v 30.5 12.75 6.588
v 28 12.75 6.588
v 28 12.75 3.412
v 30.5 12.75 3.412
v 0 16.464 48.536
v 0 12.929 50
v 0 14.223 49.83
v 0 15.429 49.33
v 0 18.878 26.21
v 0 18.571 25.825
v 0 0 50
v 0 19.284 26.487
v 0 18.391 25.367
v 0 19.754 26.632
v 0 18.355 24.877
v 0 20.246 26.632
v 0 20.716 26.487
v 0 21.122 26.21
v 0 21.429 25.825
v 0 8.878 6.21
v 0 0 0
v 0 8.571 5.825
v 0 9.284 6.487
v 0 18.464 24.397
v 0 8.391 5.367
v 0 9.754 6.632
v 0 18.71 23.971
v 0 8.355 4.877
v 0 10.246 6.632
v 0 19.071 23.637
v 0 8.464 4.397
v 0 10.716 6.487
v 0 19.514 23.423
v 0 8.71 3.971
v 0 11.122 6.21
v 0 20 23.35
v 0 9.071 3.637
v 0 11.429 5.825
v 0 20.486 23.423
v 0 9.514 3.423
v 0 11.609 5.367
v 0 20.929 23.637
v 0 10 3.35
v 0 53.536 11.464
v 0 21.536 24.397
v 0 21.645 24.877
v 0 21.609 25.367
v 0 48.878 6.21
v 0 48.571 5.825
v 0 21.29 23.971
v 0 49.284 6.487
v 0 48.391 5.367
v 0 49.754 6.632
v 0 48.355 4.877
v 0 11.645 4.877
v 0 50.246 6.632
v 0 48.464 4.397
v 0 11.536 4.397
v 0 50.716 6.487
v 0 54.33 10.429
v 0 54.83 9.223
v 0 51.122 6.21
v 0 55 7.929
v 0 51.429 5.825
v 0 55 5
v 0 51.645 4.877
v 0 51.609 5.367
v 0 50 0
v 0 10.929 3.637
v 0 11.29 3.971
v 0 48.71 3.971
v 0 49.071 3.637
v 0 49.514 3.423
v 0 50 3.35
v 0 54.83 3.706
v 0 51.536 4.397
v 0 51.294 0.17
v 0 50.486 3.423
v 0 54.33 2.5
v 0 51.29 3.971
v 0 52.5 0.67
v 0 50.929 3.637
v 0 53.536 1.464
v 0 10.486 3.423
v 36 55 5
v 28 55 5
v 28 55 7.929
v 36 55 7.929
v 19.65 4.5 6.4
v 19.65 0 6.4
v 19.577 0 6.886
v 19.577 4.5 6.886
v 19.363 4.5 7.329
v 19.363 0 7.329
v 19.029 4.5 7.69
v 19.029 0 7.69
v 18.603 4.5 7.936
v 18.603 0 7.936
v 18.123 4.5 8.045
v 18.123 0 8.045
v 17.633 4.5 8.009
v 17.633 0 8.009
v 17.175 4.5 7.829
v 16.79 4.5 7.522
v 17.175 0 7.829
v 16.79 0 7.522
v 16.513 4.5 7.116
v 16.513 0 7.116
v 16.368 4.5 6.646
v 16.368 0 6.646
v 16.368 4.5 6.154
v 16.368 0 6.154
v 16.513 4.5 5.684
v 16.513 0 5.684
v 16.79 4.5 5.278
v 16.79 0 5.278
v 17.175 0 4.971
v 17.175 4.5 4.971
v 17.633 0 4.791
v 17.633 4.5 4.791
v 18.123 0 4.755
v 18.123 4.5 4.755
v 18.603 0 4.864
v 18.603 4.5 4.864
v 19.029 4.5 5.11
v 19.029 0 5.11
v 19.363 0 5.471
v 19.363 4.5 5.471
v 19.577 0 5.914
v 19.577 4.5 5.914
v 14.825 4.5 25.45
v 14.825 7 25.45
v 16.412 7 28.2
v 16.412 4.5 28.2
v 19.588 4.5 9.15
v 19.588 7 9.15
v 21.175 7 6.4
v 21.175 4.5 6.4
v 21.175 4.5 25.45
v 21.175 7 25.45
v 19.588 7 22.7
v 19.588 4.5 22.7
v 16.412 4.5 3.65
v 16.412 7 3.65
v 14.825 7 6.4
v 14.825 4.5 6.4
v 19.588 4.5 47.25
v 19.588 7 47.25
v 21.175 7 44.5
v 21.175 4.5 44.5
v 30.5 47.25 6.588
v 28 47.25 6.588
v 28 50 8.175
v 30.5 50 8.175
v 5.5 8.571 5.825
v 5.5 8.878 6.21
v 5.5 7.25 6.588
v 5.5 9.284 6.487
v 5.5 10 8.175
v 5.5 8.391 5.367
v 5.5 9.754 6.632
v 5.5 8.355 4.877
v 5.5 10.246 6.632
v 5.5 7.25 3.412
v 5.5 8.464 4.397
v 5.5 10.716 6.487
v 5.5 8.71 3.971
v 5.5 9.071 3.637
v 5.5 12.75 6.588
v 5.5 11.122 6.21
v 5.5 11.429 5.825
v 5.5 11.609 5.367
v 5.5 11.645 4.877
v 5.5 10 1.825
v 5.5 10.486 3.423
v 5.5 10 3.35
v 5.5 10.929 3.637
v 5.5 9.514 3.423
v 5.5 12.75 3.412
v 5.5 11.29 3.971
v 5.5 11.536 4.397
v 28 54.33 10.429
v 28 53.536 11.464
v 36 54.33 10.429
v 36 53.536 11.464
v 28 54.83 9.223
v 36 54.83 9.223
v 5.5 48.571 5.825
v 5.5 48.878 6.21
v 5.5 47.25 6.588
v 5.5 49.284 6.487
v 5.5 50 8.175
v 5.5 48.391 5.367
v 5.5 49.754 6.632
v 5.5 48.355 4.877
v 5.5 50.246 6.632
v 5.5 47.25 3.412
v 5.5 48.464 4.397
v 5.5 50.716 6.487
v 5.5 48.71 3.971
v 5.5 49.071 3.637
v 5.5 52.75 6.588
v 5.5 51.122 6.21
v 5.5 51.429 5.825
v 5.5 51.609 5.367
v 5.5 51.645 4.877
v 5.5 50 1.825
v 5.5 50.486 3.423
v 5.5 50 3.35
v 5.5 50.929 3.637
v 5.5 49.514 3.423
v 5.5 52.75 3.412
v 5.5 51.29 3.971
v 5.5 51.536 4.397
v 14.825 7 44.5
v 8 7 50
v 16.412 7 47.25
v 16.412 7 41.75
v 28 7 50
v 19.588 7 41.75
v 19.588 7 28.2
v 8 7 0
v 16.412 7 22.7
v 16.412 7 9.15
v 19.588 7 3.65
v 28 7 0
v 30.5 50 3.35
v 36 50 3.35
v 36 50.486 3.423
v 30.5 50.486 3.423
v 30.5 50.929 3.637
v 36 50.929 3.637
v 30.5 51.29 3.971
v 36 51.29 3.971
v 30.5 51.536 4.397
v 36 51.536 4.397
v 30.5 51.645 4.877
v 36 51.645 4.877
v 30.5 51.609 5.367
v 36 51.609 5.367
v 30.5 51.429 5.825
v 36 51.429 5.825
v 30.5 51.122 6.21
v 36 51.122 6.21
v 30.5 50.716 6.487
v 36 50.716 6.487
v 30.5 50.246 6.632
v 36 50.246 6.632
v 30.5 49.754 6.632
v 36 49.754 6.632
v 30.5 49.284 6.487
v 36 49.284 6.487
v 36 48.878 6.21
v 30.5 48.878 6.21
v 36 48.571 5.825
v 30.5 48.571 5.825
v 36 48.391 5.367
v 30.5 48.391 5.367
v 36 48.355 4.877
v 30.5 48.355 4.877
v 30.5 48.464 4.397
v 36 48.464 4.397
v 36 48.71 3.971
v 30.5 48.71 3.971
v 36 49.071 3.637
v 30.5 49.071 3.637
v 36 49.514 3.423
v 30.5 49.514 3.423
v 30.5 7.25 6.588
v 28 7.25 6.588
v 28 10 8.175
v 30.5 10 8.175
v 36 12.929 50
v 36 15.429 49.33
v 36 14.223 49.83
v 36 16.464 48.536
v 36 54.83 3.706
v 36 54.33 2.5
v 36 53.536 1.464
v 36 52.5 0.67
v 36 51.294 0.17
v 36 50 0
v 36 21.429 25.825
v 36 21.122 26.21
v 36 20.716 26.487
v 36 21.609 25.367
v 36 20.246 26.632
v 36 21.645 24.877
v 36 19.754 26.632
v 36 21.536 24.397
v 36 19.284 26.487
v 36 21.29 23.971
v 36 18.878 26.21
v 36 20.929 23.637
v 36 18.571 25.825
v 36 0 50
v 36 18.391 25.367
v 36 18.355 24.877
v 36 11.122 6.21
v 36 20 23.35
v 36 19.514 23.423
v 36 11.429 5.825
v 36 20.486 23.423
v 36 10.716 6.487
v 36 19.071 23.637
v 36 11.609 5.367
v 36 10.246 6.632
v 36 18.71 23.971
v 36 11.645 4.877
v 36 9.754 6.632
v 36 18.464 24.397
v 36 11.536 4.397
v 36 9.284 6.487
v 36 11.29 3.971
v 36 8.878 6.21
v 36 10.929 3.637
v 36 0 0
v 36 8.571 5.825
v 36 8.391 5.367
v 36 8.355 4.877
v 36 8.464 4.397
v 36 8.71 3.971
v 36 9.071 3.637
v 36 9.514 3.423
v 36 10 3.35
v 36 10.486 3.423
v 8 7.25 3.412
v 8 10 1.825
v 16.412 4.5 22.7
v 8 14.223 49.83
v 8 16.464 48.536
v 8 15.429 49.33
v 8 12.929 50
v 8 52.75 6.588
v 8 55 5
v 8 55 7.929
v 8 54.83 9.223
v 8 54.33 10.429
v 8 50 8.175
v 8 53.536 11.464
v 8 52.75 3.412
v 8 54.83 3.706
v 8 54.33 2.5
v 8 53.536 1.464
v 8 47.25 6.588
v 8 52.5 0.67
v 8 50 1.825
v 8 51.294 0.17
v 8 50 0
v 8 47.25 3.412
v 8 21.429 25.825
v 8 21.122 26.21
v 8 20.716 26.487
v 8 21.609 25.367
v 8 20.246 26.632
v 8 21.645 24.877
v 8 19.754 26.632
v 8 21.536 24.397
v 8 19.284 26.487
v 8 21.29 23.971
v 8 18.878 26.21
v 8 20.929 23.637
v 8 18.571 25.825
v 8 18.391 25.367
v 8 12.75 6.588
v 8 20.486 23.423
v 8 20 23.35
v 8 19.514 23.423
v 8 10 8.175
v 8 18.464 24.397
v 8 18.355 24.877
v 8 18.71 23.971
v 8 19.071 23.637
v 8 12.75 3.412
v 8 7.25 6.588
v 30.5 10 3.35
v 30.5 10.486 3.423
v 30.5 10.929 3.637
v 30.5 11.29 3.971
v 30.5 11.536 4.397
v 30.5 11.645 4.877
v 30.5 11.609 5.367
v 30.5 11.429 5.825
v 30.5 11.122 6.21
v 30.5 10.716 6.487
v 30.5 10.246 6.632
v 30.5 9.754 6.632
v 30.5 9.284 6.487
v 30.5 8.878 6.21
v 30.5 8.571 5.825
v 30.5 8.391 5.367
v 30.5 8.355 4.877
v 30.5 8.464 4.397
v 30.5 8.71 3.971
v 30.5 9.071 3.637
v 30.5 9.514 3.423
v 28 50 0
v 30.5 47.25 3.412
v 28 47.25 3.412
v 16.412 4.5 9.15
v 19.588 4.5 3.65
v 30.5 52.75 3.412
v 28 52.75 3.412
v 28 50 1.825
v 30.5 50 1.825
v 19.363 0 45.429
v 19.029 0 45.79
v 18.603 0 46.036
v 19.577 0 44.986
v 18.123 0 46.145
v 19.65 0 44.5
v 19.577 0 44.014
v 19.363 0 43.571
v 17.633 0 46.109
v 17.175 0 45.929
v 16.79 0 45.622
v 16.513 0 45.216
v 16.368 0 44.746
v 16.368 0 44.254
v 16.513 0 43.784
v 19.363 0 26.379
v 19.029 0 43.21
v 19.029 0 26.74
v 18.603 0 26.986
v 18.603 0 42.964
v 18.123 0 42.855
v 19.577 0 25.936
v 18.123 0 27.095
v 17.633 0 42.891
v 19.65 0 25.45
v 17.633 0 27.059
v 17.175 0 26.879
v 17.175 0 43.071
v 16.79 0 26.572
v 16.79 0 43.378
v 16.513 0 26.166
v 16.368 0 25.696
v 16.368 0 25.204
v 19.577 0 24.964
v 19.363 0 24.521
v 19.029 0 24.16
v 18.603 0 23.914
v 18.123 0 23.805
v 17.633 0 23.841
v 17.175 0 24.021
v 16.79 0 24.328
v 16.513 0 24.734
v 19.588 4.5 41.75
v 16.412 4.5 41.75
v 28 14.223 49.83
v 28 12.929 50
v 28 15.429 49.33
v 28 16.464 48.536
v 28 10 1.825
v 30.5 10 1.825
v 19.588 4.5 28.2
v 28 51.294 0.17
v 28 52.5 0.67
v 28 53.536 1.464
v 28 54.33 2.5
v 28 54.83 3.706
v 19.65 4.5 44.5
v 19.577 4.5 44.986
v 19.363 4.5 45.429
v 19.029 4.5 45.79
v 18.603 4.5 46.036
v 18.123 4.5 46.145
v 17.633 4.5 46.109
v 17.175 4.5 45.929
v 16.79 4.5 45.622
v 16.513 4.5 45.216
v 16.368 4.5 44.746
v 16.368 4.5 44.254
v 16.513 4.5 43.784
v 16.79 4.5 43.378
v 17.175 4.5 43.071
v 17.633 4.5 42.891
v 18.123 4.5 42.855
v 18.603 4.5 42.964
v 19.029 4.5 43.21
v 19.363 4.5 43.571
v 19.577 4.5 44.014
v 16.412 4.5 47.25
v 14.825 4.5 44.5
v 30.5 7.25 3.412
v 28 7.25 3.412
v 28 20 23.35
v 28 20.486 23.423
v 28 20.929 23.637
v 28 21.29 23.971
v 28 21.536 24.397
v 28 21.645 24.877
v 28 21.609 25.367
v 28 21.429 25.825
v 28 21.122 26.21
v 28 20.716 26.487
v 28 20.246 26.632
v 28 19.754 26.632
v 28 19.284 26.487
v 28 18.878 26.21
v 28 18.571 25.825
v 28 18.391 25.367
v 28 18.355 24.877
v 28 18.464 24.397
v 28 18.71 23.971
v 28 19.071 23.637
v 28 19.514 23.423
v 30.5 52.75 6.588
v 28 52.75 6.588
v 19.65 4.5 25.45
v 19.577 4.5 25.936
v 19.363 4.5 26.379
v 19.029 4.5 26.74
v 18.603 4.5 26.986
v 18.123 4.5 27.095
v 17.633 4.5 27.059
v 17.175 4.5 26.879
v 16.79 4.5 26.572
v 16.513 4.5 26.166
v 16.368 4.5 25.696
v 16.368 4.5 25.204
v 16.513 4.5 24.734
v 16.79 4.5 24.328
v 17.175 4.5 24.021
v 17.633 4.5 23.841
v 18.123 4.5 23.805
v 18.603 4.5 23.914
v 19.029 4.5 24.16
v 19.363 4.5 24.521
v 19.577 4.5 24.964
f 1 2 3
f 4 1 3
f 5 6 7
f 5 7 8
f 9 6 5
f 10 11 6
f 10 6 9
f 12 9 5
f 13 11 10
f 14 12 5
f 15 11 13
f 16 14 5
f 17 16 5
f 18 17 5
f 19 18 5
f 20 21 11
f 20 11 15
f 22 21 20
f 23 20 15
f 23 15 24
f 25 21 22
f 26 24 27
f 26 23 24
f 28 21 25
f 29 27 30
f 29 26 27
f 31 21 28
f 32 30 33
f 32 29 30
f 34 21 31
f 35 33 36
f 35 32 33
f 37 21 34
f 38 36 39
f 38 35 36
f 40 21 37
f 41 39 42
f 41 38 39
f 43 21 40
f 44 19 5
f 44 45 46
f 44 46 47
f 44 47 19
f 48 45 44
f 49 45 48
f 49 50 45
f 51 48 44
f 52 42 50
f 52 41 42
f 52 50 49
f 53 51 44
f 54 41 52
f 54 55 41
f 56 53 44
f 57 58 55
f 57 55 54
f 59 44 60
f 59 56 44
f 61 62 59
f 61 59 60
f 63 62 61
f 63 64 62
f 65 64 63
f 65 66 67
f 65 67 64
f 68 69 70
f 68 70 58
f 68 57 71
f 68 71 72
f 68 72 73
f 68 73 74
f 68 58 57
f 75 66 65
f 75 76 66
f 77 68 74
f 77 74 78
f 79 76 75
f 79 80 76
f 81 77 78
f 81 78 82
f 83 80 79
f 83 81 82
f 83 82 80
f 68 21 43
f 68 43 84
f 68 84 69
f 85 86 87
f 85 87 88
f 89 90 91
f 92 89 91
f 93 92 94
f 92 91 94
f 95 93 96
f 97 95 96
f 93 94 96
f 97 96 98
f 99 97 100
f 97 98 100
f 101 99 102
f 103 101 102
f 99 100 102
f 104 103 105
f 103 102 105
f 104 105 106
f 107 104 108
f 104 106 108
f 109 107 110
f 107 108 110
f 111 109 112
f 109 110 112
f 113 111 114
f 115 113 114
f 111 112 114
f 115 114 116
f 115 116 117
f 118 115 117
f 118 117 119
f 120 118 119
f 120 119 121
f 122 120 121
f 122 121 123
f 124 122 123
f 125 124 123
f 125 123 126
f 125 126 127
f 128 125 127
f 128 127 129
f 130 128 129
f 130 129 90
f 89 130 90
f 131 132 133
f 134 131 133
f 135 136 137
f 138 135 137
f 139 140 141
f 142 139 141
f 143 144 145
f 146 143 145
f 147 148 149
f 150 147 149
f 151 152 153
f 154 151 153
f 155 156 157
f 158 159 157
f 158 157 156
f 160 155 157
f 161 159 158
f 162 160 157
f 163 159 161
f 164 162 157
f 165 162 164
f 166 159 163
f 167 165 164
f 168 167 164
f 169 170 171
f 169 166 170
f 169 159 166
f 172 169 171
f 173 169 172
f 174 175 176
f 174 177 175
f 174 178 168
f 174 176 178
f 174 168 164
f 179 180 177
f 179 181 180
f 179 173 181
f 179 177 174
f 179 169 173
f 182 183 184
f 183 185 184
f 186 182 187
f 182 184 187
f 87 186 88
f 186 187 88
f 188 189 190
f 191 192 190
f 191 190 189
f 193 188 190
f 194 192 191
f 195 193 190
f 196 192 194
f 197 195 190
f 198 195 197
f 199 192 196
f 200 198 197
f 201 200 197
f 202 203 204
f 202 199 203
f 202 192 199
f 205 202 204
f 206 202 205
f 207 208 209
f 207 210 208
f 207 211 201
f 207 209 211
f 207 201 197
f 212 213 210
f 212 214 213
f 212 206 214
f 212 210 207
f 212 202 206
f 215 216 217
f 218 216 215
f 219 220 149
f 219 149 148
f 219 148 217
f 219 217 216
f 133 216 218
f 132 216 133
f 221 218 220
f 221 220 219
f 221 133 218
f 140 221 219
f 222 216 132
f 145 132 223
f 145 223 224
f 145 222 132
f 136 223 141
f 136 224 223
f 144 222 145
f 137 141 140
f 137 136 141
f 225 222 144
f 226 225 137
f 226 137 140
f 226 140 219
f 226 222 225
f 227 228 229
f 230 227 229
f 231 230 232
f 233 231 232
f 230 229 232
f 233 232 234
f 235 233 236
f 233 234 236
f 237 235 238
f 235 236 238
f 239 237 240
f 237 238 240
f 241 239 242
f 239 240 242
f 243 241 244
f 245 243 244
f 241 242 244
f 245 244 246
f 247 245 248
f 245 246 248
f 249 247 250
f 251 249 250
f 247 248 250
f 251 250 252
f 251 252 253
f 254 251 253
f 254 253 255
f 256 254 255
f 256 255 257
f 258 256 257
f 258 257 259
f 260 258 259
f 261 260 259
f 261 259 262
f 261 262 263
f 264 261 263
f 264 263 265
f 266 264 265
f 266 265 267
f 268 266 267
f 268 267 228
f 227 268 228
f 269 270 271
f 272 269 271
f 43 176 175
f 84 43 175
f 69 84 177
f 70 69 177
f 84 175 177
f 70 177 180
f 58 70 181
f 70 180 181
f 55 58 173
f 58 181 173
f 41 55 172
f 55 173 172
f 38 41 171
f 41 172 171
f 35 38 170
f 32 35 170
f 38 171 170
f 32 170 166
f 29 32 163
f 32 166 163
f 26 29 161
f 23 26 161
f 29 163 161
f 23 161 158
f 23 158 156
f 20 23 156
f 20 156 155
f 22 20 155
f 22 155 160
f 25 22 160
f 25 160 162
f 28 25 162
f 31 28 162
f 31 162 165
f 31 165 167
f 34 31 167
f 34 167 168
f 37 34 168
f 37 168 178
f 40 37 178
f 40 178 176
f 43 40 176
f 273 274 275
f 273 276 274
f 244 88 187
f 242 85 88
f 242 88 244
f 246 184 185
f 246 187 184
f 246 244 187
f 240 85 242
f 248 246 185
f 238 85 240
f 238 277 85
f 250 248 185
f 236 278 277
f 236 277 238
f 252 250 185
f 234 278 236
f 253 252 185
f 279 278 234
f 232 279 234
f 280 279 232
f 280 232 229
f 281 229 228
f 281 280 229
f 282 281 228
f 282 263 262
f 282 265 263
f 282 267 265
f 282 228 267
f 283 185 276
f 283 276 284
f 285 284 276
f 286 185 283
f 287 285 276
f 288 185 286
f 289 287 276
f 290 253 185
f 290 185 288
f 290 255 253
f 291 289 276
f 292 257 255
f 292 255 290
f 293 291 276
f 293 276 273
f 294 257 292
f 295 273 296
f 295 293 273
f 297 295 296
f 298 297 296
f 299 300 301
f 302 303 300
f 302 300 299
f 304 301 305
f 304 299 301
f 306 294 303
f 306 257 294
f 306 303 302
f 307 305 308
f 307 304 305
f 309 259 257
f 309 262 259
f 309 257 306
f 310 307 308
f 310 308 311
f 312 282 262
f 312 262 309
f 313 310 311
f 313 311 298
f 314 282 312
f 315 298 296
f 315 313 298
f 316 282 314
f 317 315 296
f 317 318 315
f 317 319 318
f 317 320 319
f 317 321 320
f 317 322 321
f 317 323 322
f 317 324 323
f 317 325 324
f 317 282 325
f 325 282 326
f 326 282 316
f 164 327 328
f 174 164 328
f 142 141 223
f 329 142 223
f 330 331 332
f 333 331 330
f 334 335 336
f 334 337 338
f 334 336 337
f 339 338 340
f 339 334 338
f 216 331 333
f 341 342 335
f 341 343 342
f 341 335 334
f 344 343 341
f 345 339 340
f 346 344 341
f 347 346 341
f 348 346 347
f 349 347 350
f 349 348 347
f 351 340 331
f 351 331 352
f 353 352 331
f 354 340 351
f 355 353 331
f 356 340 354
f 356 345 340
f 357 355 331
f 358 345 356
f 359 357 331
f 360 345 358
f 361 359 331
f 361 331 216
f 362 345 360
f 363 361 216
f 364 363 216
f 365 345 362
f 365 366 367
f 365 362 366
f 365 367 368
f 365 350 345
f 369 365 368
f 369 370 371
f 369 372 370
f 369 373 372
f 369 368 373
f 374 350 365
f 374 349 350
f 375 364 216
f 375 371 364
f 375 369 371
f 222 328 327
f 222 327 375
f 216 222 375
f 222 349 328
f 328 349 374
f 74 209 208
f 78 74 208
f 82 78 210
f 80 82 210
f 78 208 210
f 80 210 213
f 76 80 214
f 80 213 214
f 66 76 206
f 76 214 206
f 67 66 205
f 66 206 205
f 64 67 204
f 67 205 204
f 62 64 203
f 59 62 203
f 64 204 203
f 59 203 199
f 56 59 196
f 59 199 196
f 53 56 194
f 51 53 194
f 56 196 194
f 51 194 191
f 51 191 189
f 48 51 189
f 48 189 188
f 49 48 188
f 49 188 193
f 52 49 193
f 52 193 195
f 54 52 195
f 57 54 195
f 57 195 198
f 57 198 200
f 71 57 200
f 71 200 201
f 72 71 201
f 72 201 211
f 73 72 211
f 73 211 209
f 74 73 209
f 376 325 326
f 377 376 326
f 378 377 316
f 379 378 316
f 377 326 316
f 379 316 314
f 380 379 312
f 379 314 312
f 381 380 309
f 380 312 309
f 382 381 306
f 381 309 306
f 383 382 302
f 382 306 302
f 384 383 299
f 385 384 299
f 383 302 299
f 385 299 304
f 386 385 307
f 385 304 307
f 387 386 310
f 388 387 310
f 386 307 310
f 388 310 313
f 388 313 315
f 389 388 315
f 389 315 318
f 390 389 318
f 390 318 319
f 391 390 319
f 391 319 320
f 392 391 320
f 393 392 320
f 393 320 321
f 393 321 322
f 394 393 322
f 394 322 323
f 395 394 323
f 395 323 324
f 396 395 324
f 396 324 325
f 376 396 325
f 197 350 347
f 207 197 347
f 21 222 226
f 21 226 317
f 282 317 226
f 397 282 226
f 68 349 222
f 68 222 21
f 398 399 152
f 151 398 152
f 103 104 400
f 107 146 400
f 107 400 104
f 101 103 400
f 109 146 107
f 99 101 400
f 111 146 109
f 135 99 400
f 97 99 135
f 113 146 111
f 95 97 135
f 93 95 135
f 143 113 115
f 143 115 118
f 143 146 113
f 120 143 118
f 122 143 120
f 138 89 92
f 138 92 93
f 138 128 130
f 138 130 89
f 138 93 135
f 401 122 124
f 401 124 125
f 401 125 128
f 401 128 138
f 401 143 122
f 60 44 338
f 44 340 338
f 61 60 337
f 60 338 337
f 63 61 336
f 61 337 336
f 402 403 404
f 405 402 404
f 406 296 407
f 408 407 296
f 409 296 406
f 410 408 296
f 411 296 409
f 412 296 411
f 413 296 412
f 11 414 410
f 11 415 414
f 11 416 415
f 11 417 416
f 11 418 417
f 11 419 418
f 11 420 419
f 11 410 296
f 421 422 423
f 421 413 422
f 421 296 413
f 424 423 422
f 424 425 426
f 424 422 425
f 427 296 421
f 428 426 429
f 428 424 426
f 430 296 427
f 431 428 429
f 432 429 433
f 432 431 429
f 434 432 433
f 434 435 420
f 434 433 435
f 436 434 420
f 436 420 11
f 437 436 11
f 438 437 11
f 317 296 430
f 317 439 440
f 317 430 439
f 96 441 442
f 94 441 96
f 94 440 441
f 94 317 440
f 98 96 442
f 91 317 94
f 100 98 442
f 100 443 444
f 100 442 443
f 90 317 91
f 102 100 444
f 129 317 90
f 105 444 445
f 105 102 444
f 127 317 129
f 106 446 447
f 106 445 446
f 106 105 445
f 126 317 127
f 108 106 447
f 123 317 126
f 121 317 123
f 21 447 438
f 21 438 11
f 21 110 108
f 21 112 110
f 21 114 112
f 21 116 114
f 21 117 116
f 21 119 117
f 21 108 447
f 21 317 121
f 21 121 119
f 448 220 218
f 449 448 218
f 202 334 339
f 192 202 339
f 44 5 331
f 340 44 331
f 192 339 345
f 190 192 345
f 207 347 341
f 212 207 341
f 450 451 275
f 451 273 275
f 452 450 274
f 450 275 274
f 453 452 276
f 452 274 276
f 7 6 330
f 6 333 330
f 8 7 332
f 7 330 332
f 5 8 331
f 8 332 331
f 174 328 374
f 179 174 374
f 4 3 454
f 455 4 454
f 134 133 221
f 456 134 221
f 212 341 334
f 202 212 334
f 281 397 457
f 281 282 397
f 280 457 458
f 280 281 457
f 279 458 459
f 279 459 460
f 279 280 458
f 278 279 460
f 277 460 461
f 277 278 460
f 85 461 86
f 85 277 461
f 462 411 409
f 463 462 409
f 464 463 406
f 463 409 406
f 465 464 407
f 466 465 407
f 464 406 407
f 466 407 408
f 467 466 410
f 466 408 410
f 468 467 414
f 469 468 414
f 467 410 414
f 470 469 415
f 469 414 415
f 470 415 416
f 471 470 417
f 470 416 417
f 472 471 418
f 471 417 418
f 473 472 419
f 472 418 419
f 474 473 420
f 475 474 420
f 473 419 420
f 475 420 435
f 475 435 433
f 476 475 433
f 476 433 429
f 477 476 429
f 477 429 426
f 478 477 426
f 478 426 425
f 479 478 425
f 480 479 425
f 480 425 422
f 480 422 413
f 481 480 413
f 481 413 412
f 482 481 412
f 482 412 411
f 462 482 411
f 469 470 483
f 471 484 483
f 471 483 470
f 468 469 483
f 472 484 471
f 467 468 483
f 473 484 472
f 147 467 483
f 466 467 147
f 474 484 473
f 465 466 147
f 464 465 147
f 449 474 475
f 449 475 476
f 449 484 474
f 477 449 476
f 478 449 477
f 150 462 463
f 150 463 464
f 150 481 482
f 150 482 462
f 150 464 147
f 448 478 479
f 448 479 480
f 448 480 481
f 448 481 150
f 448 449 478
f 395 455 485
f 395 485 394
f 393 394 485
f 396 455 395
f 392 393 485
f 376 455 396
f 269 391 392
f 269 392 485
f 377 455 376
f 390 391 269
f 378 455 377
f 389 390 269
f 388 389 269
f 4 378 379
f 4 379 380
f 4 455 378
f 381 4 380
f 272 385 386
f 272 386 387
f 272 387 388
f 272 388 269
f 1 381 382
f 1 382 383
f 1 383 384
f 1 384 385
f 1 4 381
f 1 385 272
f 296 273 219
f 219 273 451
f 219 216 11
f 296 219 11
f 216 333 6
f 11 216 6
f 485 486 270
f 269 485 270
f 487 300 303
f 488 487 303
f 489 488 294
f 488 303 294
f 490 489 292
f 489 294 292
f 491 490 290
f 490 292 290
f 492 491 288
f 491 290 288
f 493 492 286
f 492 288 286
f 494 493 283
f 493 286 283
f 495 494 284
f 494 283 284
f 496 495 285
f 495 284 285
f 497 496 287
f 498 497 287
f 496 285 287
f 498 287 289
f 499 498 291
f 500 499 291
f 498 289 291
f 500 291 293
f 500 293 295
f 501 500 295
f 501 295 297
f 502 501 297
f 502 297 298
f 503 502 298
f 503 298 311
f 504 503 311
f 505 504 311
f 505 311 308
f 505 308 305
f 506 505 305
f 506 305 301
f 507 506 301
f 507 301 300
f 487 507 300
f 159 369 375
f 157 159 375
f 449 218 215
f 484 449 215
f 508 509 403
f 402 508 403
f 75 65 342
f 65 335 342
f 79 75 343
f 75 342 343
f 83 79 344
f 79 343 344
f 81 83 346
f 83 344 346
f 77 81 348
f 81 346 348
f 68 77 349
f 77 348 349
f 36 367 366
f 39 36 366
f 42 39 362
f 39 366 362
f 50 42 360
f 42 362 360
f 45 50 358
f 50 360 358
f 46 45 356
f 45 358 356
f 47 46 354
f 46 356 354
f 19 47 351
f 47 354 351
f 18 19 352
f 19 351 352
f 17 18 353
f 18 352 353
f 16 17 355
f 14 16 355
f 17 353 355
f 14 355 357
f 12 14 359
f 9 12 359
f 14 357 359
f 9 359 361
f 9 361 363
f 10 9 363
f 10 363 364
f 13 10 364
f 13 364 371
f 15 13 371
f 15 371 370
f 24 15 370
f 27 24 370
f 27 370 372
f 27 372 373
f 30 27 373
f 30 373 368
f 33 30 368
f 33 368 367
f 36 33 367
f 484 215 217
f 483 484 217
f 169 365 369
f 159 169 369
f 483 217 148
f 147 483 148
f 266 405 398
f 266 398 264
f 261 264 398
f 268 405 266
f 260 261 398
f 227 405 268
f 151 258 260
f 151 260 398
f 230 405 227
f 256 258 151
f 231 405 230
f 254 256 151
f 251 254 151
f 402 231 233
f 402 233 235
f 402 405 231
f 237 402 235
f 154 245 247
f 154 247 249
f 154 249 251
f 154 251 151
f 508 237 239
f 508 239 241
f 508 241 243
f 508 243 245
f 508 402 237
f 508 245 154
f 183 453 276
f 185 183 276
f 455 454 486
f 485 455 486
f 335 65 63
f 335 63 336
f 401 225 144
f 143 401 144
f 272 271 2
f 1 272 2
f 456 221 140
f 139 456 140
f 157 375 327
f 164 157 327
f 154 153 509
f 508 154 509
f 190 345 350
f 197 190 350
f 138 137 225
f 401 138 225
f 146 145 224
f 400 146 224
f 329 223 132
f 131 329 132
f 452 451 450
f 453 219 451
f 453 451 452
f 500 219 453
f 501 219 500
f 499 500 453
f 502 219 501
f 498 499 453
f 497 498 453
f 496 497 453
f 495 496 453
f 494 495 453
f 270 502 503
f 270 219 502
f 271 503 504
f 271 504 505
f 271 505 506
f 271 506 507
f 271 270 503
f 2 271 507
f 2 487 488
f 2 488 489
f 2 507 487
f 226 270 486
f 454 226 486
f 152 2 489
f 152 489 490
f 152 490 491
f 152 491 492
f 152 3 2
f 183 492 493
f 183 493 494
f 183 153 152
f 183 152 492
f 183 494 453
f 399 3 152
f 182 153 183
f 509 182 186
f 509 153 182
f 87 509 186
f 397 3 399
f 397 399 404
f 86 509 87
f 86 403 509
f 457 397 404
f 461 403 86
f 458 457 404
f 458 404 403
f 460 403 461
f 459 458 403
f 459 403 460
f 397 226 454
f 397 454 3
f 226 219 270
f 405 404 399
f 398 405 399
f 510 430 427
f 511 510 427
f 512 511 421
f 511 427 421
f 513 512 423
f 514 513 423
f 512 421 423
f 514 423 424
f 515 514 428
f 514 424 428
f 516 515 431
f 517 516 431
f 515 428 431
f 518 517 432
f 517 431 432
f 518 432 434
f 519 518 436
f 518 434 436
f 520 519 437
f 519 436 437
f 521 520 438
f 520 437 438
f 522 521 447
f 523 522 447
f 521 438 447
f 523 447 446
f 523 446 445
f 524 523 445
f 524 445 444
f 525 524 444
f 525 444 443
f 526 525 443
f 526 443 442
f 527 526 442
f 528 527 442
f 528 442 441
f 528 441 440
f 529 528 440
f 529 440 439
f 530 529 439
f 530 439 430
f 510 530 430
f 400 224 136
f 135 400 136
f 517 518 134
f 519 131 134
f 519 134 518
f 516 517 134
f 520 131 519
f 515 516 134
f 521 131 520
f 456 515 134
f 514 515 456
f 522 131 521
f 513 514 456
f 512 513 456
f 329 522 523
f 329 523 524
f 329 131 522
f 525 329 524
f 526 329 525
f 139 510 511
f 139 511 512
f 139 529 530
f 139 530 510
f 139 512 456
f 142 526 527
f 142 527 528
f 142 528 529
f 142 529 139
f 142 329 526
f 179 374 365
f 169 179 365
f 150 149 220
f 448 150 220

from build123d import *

# Parameters (mm, degrees)
P_IDAT_VYSUNUT_M1_DEPTH  = 50
ZKOSEN_1_SIZE            = 40
ZKOSEN_2_SIZE            = 40
SKICA2_R                 = 1.65
ODEBRAT_VYSUNUT_M1_DEPTH = 37
ZAOBLIT1_R               = 5
ODEBRAT_VYSUNUT_M2_DEPTH = 2.5
ODEBRAT_VYSUNUT_M3_DEPTH = 2.5
SKICA7_R                 = 1.65
ODEBRAT_VYSUNUT_M4_DEPTH = 56
ODEBRAT_VYSUNUT_M5_DEPTH = 2.5


with BuildPart() as part:
    # Skica1 → Přidat vysunutím1 (new body)
    with BuildSketch(Plane.XY):
        Polygon((0, 0), (0, 55), (8, 55), (8, 7), (28, 7), (28, 55), (36, 55), (36, 0), align=None)
    extrude(amount=P_IDAT_VYSUNUT_M1_DEPTH)

    # Zkosení1
    zkosen_1_edges = [part.edges().sort_by_distance(p)[0] for p in [
        (32, 55, 50),
    ]]
    chamfer(zkosen_1_edges, length=ZKOSEN_1_SIZE)

    # Zkosení2
    zkosen_2_edges = [part.edges().sort_by_distance(p)[0] for p in [
        (4, 55, 50),
    ]]
    chamfer(zkosen_2_edges, length=ZKOSEN_2_SIZE)

    # Skica2 → Odebrat vysunutím1 (cut, through all)
    with BuildSketch(Plane(origin=(36, 0, 0), x_dir=(0, 0, -1), z_dir=(1, 0, 0))):
        with Locations((-5, 50)):
            Circle(SKICA2_R)
        with Locations((-5, 10)):
            Circle(SKICA2_R)
        with Locations((-25, 20)):
            Circle(SKICA2_R)
    extrude(amount=-ODEBRAT_VYSUNUT_M1_DEPTH, mode=Mode.SUBTRACT)

    # Zaoblit1
    zaoblit1_edges = [part.edges().sort_by_distance(p)[0] for p in [
        (32, 15, 50),
        (32, 55, 10),
        (4, 15, 50),
        (4, 55, 10),
        (4, 55, 0),
        (32, 55, 0),
    ]]
    fillet(zaoblit1_edges, radius=ZAOBLIT1_R)

    # Skica3 → Odebrat vysunutím2 (cut)
    with BuildSketch(Plane.ZY.offset(-28)):
        Polygon((6.58771324, 52.75), (3.41228676, 52.75), (1.824573519, 50), (3.41228676, 47.25), (6.58771324, 47.25), (8.175426481, 50), align=None)
        Polygon((6.58771324, 12.75), (3.41228676, 12.75), (1.824573519, 10), (3.41228676, 7.25), (6.58771324, 7.25), (8.175426481, 10), align=None)
    extrude(amount=-ODEBRAT_VYSUNUT_M2_DEPTH, mode=Mode.SUBTRACT)

    # Skica6 → Odebrat vysunutím3 (cut)
    with BuildSketch(Plane(origin=(8, 0, 0), x_dir=(0, 0, -1), z_dir=(1, 0, 0))):
        Polygon((-3.41228676, 52.75), (-6.58771324, 52.75), (-8.175426481, 50), (-6.58771324, 47.25), (-3.41228676, 47.25), (-1.824573519, 50), align=None)
        Polygon((-3.41228676, 12.75), (-6.58771324, 12.75), (-8.175426481, 10), (-6.58771324, 7.25), (-3.41228676, 7.25), (-1.824573519, 10), align=None)
    extrude(amount=-ODEBRAT_VYSUNUT_M3_DEPTH, mode=Mode.SUBTRACT)

    # Skica7 → Odebrat vysunutím4 (cut, through all)
    with BuildSketch(Plane.XZ):
        with Locations((18, 44.5)):
            Circle(SKICA7_R)
        with Locations((18, 25.45)):
            Circle(SKICA7_R)
        with Locations((18, 6.4)):
            Circle(SKICA7_R)
    extrude(amount=-ODEBRAT_VYSUNUT_M4_DEPTH, mode=Mode.SUBTRACT)

    # Skica8 → Odebrat vysunutím5 (cut)
    with BuildSketch(Plane(origin=(0, 7, 0), x_dir=(1, 0, 0), z_dir=(0, 1, 0))):
        Polygon((14.824573519, -6.4), (16.41228676, -9.15), (19.58771324, -9.15), (21.175426481, -6.4), (19.58771324, -3.65), (16.41228676, -3.65), align=None)
        Polygon((14.824573519, -25.45), (16.41228676, -28.2), (19.58771324, -28.2), (21.175426481, -25.45), (19.58771324, -22.7), (16.41228676, -22.7), align=None)
        Polygon((14.824573519, -44.5), (16.41228676, -47.25), (19.58771324, -47.25), (21.175426481, -44.5), (19.58771324, -41.75), (16.41228676, -41.75), align=None)
    extrude(amount=-ODEBRAT_VYSUNUT_M5_DEPTH, mode=Mode.SUBTRACT)


solid = part.part
